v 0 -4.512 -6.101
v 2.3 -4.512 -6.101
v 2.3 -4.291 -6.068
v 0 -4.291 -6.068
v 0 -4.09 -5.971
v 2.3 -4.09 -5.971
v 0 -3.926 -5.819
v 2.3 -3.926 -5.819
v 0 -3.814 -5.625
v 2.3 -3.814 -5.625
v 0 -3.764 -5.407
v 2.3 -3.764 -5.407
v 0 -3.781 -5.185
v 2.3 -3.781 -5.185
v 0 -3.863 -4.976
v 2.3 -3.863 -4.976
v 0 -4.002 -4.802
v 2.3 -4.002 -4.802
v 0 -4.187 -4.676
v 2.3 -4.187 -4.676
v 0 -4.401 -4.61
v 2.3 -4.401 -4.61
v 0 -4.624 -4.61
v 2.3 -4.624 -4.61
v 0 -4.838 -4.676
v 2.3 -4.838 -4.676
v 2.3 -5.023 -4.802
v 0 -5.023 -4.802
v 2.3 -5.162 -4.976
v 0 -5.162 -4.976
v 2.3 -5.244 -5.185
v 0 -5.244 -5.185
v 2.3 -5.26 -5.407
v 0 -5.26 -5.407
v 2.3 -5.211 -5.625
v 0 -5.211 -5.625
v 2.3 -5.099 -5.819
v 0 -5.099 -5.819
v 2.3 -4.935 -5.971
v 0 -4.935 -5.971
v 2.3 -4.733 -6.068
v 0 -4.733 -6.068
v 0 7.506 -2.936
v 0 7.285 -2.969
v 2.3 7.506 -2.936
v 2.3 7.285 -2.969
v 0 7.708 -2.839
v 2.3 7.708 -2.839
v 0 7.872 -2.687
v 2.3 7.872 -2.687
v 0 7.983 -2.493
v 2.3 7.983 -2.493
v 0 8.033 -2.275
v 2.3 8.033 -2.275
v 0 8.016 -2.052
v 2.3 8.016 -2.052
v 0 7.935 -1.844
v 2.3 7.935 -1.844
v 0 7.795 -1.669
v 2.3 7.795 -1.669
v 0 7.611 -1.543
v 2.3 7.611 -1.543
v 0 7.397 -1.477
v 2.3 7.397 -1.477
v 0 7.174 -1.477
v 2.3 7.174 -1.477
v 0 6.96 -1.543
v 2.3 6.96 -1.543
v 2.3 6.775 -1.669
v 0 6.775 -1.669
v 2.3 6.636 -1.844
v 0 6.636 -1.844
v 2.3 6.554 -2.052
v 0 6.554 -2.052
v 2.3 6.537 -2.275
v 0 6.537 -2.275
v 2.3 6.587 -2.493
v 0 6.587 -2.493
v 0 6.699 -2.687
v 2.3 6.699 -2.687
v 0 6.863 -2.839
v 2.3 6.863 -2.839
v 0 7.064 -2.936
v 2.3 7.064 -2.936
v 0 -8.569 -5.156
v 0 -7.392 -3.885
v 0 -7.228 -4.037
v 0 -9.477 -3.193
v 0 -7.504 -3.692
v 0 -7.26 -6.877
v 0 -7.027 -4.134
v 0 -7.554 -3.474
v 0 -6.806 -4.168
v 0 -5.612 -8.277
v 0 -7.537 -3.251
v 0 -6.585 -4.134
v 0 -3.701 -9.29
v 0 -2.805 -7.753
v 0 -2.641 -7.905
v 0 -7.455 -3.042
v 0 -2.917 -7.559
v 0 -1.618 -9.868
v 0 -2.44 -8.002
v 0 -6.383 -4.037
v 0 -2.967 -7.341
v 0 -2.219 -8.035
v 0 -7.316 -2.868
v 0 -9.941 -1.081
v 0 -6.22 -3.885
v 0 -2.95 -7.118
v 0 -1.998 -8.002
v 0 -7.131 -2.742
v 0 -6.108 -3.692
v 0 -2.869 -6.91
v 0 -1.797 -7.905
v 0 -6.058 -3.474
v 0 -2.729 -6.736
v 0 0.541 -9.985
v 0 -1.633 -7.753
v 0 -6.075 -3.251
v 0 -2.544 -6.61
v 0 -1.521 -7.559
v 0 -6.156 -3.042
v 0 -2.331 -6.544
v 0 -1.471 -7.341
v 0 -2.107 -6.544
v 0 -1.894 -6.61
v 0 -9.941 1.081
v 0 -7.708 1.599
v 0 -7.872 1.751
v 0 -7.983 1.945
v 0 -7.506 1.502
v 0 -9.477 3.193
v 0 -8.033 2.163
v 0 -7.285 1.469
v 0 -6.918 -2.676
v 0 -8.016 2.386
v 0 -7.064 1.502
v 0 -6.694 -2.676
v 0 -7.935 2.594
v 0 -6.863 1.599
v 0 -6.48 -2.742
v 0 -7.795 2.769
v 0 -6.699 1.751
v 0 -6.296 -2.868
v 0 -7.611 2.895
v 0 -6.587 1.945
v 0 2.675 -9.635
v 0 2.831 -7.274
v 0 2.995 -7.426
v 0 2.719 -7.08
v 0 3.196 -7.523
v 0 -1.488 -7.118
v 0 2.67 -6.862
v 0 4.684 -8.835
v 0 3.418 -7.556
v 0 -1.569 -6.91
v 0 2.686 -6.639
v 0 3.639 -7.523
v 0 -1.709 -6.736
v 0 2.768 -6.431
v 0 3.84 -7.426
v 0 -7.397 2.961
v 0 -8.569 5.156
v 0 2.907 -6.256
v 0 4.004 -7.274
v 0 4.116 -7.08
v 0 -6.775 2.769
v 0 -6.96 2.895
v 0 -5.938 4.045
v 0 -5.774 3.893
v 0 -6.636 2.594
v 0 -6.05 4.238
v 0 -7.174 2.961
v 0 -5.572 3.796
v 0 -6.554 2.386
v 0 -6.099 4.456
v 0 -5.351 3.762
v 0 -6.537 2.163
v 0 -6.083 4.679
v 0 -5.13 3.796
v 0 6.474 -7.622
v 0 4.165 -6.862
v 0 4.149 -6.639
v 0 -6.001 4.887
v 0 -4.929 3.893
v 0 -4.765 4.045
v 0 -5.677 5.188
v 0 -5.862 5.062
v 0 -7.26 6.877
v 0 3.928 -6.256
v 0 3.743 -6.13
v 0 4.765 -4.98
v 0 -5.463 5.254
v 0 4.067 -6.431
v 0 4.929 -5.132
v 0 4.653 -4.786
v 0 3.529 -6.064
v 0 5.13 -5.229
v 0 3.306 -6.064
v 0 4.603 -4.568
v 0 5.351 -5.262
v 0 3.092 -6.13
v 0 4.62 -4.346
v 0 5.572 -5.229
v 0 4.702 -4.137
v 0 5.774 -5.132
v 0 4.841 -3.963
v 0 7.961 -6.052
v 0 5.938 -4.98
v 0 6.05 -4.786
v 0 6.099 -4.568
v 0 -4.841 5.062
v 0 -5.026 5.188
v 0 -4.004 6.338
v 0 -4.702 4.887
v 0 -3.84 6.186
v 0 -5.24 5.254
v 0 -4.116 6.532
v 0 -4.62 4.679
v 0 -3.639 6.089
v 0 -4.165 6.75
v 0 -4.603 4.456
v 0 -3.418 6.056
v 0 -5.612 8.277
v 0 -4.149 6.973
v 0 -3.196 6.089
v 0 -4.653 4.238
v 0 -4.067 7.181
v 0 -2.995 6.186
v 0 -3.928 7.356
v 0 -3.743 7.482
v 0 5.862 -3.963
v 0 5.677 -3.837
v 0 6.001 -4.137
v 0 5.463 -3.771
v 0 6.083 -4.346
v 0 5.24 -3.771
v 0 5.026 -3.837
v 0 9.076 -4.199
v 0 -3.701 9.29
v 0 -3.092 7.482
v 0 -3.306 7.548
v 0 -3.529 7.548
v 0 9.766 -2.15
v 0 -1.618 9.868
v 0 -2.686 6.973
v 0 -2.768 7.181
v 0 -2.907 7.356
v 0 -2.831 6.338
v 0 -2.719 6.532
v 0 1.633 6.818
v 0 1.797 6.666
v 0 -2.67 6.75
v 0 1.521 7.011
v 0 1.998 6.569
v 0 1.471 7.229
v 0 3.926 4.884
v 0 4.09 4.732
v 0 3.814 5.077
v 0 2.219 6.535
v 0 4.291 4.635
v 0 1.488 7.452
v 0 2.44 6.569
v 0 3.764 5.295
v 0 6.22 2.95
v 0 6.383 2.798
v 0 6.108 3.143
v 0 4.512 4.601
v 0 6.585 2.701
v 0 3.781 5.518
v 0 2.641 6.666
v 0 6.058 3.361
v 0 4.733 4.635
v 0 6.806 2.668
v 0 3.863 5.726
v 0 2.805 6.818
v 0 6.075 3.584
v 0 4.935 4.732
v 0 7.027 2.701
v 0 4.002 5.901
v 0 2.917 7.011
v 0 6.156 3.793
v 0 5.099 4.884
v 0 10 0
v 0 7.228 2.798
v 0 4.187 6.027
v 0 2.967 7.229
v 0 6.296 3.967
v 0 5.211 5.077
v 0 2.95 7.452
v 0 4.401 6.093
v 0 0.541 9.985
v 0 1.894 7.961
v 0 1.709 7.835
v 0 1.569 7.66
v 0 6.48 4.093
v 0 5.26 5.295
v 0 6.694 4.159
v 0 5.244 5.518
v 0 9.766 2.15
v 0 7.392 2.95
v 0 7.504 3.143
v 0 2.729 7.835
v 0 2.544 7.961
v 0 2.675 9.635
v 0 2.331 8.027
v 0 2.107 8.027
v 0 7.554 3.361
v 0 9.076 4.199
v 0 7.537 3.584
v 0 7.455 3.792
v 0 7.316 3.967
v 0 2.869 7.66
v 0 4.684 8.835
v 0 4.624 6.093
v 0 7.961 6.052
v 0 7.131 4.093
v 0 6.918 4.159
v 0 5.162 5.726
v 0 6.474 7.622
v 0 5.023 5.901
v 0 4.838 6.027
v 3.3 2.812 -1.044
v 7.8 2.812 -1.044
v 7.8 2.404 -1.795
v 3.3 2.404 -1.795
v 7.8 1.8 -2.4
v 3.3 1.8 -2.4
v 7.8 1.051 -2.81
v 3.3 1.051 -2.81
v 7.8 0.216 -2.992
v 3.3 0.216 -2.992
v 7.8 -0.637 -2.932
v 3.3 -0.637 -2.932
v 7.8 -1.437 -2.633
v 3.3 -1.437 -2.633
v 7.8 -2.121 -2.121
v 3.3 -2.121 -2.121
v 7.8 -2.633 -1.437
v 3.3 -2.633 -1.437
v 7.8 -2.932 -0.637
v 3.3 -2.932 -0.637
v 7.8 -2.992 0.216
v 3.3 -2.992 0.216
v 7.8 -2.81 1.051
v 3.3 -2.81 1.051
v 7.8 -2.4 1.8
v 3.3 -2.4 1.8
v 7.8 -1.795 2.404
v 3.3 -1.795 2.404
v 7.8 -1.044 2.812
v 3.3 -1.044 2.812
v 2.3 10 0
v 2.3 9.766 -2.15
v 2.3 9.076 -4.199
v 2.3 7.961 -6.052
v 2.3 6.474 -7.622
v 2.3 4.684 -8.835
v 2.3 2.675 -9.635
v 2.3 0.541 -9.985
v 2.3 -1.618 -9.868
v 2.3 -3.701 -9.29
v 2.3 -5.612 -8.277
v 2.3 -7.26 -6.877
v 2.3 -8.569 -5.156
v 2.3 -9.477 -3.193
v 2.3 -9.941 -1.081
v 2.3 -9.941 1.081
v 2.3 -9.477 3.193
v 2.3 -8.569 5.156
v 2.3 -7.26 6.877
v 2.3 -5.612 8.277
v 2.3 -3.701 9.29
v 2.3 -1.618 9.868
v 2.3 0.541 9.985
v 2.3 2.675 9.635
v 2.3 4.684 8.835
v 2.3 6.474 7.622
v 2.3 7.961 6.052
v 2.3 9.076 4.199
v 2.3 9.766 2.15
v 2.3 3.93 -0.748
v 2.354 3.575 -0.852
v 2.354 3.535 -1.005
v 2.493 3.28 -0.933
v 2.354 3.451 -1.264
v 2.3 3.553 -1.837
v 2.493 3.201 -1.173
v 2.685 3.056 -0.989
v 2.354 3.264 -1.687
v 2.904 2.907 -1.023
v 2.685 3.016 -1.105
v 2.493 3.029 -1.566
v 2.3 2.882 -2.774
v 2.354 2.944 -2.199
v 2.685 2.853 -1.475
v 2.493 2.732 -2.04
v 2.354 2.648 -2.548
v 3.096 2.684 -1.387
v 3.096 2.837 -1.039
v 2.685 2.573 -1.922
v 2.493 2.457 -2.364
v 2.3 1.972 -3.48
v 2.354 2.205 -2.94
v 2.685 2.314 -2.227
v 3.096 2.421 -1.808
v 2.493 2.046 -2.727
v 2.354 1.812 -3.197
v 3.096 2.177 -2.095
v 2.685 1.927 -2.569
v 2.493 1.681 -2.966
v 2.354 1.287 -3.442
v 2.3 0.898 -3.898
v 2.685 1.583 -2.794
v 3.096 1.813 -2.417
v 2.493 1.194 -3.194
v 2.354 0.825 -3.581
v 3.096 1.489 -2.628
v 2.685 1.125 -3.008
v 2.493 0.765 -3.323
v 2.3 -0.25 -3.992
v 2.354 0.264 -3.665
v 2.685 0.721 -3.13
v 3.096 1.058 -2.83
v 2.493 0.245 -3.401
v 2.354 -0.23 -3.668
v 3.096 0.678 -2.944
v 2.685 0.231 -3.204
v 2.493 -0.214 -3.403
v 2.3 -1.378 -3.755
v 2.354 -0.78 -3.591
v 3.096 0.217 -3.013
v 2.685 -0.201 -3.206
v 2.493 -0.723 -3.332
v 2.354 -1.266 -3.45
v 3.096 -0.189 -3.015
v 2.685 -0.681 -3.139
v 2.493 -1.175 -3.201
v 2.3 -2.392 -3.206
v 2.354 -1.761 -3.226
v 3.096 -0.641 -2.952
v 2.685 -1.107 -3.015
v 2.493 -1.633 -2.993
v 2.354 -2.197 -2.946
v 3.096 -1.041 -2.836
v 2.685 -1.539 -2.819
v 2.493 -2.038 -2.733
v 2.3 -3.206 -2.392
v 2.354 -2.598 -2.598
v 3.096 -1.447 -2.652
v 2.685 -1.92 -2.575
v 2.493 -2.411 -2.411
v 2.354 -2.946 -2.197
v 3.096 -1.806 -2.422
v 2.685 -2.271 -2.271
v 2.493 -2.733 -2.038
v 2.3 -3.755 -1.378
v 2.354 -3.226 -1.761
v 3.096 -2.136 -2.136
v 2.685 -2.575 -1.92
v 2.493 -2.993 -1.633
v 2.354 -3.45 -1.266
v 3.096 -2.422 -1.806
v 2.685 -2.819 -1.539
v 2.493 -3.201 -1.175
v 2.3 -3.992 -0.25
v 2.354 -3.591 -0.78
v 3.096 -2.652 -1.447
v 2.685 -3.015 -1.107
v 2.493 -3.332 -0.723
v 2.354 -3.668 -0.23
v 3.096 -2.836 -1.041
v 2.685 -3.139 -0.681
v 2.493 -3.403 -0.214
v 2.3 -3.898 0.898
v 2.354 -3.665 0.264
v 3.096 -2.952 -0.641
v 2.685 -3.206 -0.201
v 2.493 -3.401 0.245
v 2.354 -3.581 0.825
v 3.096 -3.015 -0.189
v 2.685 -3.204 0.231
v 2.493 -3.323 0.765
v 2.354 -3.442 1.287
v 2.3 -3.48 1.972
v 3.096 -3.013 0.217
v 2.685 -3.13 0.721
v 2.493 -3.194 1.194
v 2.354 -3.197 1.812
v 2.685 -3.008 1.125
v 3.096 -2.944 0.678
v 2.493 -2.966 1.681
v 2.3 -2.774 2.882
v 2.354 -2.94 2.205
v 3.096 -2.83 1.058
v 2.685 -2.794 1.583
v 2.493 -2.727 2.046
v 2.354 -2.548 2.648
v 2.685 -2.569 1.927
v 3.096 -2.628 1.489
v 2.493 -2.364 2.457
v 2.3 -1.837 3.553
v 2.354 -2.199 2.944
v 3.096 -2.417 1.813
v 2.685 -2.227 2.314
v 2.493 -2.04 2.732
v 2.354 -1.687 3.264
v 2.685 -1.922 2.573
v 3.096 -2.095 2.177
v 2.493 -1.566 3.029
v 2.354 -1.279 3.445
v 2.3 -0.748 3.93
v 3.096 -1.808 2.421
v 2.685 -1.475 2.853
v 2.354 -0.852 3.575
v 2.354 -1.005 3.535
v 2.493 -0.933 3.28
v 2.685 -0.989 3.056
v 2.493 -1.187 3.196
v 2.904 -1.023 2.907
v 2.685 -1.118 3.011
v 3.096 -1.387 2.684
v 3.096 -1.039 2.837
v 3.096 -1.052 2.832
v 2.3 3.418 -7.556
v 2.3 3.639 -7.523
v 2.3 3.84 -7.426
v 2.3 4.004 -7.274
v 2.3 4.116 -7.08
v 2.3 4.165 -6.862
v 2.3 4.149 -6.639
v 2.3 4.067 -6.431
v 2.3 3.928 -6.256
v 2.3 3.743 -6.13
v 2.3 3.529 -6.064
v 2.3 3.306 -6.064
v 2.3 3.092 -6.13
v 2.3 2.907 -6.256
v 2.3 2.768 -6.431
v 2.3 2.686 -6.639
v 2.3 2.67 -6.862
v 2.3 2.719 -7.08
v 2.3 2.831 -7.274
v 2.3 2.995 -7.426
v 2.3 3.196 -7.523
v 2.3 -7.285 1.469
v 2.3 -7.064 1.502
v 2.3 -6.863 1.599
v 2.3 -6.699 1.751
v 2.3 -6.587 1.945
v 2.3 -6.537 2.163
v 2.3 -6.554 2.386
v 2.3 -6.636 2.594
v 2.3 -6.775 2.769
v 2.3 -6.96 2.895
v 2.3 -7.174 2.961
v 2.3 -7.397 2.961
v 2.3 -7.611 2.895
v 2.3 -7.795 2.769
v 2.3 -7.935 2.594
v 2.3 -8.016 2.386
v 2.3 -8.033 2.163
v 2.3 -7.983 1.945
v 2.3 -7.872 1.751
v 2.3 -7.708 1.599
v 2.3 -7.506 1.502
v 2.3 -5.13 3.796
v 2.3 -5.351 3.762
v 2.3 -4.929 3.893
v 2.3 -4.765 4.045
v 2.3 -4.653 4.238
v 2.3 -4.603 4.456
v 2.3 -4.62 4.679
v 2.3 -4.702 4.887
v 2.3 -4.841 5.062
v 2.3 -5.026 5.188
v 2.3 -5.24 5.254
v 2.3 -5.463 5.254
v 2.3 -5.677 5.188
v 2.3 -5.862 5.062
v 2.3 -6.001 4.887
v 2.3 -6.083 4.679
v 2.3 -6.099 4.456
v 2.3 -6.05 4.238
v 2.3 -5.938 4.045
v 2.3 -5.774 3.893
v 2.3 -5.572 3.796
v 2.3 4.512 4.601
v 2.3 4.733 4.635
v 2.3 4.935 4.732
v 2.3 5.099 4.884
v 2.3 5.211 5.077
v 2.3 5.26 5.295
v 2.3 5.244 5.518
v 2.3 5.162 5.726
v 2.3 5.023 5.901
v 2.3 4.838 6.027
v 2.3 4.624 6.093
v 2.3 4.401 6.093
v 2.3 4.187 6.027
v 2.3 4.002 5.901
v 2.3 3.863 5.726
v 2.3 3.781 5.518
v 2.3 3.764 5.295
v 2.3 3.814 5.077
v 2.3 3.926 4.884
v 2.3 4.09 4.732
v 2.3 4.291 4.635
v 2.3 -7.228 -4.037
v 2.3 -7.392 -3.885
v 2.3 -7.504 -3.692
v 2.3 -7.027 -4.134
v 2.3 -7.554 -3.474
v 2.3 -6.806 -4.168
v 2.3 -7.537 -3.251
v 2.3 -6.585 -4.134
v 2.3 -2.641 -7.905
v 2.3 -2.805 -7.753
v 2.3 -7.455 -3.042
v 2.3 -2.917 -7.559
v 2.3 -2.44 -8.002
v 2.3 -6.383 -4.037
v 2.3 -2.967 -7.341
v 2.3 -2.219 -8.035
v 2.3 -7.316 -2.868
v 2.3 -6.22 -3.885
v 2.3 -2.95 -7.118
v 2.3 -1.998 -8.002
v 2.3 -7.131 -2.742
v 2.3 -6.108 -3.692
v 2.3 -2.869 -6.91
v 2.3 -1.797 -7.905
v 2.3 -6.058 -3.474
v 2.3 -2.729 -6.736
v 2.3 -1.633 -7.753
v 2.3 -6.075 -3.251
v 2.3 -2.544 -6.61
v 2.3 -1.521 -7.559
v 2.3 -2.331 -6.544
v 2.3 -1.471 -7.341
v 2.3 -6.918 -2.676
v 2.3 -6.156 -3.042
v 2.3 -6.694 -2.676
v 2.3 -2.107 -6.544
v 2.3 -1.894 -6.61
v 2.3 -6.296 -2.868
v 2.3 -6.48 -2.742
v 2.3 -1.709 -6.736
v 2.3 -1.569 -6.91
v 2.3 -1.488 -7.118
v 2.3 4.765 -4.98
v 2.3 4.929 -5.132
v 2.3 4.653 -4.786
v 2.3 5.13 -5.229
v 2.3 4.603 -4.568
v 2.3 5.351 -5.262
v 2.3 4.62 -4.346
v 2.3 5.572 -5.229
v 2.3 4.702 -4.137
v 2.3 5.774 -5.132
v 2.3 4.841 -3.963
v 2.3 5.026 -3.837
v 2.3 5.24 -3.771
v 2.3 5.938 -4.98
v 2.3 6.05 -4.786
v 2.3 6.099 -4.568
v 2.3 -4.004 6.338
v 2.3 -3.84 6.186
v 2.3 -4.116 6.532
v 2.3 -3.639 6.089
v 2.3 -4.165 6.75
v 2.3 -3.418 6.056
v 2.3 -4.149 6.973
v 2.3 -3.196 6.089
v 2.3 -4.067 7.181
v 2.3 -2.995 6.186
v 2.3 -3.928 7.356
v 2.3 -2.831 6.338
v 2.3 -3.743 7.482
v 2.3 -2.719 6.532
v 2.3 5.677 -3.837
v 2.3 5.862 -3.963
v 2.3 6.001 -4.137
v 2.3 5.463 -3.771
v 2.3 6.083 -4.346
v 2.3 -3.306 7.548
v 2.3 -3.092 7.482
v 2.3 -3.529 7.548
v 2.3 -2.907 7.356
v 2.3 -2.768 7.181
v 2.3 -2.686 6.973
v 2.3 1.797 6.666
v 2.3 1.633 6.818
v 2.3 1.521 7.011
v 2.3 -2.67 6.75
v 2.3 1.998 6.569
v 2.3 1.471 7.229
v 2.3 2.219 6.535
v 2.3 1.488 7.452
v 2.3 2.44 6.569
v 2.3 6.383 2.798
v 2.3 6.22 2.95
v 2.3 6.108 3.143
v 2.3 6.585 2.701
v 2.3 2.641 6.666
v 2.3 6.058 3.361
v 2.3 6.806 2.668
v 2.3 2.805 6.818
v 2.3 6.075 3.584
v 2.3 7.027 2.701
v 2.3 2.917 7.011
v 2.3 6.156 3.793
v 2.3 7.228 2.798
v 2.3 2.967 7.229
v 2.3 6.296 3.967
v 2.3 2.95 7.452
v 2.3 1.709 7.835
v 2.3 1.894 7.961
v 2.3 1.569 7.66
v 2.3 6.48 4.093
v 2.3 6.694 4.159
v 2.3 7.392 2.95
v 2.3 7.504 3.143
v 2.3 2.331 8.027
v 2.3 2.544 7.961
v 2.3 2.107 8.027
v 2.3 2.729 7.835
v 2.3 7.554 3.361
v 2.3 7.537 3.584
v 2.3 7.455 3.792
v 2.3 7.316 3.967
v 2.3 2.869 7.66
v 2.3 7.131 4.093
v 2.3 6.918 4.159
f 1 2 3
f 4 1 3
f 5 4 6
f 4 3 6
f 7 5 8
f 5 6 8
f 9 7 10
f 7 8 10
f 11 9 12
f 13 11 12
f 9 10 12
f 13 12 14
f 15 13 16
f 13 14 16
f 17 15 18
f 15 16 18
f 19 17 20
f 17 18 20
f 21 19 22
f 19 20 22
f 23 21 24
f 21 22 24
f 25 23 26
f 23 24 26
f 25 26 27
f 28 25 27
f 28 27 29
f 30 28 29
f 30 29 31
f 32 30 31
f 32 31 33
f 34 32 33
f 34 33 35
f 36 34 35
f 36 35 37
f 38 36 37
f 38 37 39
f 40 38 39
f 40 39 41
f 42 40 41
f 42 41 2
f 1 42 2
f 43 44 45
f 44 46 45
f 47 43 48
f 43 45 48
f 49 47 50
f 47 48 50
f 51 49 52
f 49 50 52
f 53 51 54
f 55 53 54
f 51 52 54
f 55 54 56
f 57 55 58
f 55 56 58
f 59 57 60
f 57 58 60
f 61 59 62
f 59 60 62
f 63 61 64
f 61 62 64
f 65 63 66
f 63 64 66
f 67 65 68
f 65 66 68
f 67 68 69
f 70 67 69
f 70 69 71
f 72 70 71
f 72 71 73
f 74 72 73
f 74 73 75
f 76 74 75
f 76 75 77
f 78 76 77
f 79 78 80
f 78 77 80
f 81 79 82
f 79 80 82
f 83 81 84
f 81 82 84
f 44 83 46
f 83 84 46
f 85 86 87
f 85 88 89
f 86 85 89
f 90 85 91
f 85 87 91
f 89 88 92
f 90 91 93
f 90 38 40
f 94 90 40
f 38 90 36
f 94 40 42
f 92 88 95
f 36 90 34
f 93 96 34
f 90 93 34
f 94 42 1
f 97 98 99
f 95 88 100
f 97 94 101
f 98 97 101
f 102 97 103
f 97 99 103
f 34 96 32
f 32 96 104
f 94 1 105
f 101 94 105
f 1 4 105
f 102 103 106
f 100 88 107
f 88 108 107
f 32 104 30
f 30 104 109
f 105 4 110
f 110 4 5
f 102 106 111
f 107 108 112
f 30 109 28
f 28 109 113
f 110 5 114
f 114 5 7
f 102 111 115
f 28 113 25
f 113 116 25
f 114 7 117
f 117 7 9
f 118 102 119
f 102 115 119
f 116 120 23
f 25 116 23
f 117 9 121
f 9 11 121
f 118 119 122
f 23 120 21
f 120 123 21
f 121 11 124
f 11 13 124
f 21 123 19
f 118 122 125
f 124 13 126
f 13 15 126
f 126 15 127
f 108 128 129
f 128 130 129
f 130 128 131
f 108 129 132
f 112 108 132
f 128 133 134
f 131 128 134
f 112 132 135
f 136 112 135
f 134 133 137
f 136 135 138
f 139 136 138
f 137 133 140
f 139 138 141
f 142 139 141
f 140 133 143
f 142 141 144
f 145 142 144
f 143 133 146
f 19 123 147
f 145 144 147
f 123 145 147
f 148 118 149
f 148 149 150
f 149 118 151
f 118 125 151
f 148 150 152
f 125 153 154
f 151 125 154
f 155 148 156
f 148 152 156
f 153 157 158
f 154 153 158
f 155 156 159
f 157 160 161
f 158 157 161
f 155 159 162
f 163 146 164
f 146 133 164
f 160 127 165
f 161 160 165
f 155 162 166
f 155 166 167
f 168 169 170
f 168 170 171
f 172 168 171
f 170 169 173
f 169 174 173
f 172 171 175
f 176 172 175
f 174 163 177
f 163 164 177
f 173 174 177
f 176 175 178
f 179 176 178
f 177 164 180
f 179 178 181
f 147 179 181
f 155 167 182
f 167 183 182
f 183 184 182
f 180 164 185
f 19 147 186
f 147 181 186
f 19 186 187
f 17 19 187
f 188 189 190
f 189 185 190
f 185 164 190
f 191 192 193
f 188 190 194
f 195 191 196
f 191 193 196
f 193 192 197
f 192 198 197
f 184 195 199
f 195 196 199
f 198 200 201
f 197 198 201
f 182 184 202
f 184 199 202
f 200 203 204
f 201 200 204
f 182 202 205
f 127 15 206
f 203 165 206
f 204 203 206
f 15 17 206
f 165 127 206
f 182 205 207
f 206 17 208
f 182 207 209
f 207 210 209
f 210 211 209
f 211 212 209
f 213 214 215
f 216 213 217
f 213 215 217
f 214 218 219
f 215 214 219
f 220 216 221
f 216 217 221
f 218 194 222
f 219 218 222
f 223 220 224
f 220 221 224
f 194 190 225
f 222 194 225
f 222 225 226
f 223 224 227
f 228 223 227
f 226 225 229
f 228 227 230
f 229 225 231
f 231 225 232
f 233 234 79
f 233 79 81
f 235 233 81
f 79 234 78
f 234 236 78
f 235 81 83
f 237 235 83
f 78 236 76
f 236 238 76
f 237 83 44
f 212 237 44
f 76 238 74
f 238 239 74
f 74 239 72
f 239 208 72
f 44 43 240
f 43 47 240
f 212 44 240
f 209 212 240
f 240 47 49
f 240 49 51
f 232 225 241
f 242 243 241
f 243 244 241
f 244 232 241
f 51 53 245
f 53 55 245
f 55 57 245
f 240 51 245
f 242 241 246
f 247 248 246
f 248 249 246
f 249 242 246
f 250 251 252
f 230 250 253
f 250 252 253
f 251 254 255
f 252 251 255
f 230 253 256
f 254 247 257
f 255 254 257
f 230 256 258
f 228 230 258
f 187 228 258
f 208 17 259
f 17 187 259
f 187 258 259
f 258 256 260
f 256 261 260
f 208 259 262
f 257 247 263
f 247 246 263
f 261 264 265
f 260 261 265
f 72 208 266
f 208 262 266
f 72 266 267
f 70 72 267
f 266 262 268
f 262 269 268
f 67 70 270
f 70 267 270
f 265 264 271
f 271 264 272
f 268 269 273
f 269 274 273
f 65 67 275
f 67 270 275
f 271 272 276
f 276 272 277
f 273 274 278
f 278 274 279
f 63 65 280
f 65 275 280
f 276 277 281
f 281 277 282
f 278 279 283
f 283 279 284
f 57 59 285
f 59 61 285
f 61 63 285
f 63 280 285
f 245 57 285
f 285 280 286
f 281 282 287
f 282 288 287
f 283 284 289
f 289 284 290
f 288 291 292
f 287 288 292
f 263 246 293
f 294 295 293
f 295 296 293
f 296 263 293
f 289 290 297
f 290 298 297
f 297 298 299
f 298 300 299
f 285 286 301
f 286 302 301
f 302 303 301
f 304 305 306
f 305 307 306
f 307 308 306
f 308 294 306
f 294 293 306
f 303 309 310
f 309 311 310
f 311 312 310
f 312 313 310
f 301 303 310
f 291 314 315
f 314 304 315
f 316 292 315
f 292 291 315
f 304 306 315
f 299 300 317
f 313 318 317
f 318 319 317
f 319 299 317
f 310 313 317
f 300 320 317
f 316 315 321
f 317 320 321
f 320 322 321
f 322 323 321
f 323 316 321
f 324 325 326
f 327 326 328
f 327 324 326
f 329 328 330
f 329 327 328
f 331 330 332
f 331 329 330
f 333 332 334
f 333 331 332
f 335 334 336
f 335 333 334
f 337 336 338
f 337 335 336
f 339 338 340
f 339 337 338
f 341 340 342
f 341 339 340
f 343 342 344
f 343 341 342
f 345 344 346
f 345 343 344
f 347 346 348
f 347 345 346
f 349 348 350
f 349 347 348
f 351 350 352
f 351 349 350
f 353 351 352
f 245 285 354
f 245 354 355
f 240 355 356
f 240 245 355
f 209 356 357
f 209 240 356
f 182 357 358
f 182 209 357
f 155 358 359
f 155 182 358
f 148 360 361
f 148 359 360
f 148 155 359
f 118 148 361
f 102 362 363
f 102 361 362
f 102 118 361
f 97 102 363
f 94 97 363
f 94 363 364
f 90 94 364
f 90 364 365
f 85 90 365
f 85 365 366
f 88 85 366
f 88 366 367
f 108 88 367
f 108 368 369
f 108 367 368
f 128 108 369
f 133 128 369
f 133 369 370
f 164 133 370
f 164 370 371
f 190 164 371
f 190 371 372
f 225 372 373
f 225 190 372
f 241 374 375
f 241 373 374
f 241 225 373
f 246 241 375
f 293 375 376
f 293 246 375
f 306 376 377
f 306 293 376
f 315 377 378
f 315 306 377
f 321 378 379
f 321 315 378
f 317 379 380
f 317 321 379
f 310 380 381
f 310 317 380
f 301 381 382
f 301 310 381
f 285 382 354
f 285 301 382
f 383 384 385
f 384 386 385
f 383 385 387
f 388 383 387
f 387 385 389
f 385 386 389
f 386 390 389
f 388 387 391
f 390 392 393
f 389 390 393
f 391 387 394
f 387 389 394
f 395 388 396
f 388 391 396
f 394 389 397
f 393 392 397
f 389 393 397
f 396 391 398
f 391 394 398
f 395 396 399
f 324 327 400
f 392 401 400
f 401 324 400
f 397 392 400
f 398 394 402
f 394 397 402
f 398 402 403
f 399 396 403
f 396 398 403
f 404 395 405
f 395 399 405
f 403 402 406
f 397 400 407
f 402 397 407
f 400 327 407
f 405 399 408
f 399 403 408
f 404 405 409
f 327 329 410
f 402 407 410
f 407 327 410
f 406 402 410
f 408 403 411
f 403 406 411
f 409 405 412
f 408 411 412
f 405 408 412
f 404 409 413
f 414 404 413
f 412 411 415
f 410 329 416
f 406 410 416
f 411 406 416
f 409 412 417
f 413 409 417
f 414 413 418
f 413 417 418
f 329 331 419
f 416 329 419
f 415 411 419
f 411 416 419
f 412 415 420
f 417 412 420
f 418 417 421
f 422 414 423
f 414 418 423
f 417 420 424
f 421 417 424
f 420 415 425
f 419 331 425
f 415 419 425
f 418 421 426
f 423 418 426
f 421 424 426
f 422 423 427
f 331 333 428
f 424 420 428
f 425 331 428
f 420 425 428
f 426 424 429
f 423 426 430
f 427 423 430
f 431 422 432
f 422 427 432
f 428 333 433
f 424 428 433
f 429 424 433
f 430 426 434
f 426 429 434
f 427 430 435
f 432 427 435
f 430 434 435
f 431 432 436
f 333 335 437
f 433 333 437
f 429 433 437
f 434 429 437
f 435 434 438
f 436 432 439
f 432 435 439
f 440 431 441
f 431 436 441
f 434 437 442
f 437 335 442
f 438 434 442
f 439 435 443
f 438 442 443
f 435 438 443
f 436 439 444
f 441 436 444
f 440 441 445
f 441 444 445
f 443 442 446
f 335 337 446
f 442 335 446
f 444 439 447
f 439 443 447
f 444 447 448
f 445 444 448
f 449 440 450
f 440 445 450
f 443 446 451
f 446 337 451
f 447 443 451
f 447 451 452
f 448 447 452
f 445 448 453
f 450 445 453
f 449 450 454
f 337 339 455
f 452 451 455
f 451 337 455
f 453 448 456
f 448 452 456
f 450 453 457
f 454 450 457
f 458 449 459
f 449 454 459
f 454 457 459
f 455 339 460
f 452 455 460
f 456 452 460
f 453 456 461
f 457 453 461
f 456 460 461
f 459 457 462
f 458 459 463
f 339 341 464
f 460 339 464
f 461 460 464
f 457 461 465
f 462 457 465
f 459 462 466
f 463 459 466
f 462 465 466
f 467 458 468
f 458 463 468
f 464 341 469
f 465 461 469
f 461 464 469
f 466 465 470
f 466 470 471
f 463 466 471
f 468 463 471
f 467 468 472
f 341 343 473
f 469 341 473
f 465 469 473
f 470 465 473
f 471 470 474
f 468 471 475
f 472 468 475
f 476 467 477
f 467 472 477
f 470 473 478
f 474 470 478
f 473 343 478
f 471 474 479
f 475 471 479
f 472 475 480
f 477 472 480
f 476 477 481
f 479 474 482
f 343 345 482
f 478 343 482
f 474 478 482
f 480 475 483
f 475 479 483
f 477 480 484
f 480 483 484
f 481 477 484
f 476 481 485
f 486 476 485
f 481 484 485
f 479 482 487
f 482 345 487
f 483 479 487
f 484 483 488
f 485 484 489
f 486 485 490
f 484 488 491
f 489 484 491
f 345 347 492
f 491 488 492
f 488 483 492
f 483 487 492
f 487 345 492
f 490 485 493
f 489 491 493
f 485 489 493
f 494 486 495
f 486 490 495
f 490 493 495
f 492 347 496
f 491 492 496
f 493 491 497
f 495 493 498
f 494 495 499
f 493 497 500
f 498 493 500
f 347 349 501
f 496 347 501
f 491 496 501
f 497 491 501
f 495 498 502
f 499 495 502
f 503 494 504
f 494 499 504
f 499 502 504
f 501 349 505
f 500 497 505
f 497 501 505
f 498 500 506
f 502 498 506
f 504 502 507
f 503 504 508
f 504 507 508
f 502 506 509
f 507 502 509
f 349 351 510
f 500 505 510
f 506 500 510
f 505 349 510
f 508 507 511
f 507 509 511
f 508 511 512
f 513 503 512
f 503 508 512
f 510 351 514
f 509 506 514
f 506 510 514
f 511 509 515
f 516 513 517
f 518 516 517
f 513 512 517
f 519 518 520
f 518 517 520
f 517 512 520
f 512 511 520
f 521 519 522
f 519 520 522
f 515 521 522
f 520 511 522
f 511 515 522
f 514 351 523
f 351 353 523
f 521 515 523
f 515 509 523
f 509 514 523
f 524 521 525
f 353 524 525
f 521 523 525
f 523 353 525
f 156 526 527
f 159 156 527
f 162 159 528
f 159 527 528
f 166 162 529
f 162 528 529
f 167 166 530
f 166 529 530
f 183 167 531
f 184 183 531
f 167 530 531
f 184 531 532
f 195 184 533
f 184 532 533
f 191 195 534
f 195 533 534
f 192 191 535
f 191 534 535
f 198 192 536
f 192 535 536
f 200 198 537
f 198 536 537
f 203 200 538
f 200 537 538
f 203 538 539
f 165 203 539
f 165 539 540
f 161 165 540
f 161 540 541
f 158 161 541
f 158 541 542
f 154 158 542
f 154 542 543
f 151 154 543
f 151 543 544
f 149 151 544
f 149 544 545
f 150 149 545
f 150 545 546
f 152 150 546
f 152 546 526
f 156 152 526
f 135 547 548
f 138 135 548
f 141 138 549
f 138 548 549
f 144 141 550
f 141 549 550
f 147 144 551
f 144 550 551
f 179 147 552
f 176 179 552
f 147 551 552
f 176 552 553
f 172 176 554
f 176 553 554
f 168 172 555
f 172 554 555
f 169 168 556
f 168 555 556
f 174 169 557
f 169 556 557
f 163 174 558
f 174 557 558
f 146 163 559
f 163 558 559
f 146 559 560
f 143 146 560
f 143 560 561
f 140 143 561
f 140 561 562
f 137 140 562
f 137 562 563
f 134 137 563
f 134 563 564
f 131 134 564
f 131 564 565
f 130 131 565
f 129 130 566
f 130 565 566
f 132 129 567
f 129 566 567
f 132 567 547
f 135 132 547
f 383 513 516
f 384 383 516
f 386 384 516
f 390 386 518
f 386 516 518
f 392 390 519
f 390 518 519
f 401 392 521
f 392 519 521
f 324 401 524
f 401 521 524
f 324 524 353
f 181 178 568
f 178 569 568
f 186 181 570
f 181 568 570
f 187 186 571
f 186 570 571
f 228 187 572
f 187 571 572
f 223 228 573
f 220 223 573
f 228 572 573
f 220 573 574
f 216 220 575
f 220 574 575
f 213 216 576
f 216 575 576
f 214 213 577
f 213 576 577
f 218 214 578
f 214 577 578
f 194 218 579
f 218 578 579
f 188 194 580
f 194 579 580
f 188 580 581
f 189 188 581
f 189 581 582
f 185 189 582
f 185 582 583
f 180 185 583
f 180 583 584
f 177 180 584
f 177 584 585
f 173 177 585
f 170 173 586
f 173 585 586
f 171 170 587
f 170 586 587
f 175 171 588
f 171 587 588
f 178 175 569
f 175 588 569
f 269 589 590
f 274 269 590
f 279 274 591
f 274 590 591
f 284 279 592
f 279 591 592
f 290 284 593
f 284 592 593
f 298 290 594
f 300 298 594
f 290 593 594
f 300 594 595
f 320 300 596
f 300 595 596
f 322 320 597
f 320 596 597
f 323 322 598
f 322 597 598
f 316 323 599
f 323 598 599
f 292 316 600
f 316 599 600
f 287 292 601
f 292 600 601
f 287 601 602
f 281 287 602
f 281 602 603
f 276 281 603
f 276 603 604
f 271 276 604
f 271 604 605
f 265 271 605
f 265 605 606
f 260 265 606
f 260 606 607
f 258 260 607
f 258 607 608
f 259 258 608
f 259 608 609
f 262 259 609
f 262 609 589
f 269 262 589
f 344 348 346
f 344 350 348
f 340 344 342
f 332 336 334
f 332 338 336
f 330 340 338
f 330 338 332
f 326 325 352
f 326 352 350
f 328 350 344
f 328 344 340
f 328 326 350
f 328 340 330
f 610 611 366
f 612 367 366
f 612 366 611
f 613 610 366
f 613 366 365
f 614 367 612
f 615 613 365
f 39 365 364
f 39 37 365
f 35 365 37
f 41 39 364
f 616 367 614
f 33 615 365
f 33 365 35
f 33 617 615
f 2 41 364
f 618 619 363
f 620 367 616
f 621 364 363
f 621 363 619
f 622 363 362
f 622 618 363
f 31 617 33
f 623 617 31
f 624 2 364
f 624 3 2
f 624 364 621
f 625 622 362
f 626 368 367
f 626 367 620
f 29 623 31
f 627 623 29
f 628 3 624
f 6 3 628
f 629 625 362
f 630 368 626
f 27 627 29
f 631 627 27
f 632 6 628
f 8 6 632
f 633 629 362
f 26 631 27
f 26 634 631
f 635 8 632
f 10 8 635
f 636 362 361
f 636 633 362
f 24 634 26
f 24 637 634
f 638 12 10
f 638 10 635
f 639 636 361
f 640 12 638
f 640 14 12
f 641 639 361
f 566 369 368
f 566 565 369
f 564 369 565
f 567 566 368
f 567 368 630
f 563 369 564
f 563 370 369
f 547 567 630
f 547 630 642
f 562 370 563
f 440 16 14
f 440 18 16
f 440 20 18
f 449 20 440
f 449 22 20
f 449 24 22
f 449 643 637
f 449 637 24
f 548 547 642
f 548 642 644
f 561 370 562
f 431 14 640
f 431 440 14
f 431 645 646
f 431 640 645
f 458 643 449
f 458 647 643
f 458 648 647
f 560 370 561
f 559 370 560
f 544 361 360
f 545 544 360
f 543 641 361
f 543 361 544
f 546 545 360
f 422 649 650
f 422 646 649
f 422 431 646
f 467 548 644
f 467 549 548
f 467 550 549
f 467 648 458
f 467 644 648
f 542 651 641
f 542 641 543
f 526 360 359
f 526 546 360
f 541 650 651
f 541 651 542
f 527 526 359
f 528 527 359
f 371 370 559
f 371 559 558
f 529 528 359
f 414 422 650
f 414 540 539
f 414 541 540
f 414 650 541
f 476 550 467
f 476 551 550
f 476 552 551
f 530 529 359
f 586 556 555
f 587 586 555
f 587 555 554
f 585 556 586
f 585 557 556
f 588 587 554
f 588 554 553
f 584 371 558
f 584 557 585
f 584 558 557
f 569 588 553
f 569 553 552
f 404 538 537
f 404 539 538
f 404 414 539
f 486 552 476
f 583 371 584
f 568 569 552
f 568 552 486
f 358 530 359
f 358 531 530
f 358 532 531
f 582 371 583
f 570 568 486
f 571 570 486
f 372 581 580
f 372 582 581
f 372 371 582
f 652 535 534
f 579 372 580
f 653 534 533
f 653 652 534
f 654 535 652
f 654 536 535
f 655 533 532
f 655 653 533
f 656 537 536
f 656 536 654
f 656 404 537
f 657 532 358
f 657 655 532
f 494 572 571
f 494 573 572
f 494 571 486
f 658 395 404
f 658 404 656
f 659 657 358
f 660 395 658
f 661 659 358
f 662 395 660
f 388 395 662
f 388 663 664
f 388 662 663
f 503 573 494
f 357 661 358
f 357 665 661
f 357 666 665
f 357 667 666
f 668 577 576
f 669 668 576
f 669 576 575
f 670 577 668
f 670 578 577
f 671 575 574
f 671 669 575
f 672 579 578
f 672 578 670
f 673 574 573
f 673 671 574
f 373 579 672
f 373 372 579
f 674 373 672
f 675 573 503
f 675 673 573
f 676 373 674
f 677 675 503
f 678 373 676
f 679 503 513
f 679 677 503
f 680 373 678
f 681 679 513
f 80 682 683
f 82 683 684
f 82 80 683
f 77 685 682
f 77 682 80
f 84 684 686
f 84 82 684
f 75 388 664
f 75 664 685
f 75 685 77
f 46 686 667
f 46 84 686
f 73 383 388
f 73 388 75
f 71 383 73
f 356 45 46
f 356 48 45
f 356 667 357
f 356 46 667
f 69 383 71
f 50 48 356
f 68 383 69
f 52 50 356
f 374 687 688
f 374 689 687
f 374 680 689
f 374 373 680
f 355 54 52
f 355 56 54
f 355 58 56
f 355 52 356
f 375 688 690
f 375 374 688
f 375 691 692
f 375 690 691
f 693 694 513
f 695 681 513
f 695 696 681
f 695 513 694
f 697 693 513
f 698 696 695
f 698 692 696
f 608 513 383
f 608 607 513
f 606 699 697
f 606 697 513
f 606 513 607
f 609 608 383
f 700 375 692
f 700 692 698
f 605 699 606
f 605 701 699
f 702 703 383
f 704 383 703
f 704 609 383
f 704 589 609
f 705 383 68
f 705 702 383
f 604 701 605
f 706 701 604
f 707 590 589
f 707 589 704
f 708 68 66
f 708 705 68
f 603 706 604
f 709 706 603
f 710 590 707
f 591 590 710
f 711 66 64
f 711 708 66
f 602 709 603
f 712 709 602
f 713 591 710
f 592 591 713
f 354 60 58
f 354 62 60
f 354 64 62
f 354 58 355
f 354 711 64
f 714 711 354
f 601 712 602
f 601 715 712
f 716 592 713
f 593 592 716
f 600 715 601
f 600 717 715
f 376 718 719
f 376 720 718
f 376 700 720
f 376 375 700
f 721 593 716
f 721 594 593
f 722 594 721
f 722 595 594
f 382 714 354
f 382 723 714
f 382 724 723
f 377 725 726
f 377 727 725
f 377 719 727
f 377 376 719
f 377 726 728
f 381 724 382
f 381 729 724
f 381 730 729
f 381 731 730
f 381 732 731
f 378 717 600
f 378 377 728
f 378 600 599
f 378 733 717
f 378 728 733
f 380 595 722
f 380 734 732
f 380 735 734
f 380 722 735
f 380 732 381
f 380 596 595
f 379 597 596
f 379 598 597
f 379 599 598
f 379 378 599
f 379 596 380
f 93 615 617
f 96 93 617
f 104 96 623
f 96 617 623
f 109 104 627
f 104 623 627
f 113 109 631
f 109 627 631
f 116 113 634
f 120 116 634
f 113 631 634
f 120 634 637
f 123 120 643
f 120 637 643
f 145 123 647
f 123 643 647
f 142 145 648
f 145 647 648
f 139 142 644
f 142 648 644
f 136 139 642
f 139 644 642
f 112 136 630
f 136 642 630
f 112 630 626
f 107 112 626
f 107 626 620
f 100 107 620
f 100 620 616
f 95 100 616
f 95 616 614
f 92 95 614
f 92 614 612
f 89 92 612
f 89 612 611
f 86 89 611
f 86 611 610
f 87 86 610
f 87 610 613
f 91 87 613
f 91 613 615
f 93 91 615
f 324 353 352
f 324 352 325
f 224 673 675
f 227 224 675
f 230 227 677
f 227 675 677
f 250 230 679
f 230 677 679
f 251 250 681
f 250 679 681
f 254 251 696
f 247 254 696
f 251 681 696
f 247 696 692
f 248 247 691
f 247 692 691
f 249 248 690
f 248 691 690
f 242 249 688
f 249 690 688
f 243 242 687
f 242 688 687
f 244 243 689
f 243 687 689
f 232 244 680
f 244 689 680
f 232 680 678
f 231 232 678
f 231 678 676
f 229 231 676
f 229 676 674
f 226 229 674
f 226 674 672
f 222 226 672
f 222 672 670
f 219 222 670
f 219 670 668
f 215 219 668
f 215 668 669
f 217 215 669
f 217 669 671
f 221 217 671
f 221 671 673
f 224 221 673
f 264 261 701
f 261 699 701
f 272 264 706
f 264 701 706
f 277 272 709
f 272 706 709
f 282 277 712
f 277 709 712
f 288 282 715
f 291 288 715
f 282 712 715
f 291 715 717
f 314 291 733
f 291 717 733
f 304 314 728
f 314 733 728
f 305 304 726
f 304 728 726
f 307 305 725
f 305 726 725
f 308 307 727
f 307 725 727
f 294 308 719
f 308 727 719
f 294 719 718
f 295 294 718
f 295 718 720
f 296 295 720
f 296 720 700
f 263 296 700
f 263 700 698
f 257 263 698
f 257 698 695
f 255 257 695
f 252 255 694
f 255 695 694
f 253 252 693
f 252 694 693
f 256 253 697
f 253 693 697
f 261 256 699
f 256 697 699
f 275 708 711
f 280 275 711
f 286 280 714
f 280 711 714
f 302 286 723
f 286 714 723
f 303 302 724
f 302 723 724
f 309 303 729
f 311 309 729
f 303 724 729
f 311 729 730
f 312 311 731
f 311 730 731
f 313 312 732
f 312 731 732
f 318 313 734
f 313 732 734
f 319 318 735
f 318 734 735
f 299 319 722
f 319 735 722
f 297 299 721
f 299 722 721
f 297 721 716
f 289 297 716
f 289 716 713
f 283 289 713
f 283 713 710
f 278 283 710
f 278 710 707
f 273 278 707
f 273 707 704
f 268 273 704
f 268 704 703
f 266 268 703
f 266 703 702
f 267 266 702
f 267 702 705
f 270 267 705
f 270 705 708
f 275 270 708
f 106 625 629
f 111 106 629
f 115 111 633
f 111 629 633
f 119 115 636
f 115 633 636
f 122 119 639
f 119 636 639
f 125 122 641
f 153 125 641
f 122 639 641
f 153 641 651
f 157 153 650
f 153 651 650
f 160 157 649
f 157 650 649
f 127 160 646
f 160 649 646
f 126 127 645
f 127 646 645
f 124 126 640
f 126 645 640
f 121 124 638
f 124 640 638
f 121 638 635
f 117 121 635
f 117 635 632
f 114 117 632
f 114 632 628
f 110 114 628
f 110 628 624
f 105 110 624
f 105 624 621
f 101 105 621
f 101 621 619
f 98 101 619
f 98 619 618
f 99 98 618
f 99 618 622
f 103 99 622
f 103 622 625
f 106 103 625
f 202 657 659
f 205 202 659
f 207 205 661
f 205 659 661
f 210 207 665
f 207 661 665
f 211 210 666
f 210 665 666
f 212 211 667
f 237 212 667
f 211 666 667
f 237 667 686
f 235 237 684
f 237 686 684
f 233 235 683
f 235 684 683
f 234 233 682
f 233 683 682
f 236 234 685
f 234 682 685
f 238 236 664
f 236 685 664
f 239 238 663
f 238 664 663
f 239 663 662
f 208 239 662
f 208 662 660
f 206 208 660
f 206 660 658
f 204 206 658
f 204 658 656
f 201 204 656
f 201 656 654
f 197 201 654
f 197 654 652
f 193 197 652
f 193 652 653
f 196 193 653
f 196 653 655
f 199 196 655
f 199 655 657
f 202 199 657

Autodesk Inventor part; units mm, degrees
ref_plane "YZ Plane" through (0, 0, 0) normal (1, 0, 0) x (0, 1, 0)
ref_plane "XZ Plane" through (0, 0, 0) normal (0, 1, 0) x (-1, 0, 0)
ref_plane "XY Plane" through (0, 0, 0) normal (0, 0, 1) x (1, 0, 0)
sketch "Sketch1" plane through (0, 0, 0) normal (1, 0, 0) x (0, 1, 0)
  circle A0 centre (0, 0) radius 10
  dimension "d0" = 20
extrude "Extrusion1" add sketch "Sketch1" along normal blind 2.3
sketch "Sketch2" plane through (2.3, 0, 0) normal (1, 0, 0) x (0, 0, -1)
  circle A0 centre (0, 0) radius 10 projected
  circle A1 centre (-5.3514, 4.5124) radius 0.75 projected
  circle A2 centre (-7.2853, 2.219) radius 0.75 projected
  circle A3 centre (-4.5124, -5.3514) radius 0.75 projected
  circle A4 centre (-2.219, -7.2853) radius 0.75 projected
  circle A5 centre (3.4175, -6.8059) radius 0.75 projected
  circle A6 centre (4.5124, 5.3514) radius 0.75 projected
  circle A7 centre (2.219, 7.2853) radius 0.75 projected
  circle A8 centre (0, 0) radius 4.4 projected
  circle A9 centre (6.8059, 3.4175) radius 0.75 projected
  circle A10 centre (7.2853, -2.219) radius 0.75 projected
  circle A11 centre (5.3514, -4.5124) radius 0.75 projected
  circle A12 centre (-6.8059, -3.4175) radius 0.75 projected
  circle A13 centre (-3.4175, 6.8059) radius 0.75 projected
  circle A14 centre (0, 0) radius 1.5 projected
  point P0 (0, 0)
extrude "Extrusion2" cut sketch "Sketch2" against normal through all contours A1 | A2 | A3 | A4 | A5 | A6 | A7 | A9 | A10 | A11 | A12 | A13
sketch "Sketch3" plane through (2.3, 0, 0) normal (1, 0, 0) x (0, 0, -1)
  circle A0 centre (0, 0) radius 3
  line L0 (-4.1558, -4.1558) -> (4.1558, 4.1558) construction
  line L1 (14, 0) -> (-14, 0) projected
  line L2 (-2.8123, -1.0445) -> (1.0445, 2.8123)
  point P0 (-0.8839, 0.8839)
  dimension "d5" = 6
  dimension "d6" = 45
  dimension "d7" = 1.25
extrude "Extrusion3" add sketch "Sketch3" along normal blind 5.5 contours L1 L2 A0 | A0 L2 L1 picked at (1.3813, 0.2407) picked at (1.3839, -0.2301)
fillet "Fillet1" radius 1 2 edges at (2.3, 0.8839, 0.8839) (2.3, -2.1213, -2.1213)
properties part number "Printed Horn"
